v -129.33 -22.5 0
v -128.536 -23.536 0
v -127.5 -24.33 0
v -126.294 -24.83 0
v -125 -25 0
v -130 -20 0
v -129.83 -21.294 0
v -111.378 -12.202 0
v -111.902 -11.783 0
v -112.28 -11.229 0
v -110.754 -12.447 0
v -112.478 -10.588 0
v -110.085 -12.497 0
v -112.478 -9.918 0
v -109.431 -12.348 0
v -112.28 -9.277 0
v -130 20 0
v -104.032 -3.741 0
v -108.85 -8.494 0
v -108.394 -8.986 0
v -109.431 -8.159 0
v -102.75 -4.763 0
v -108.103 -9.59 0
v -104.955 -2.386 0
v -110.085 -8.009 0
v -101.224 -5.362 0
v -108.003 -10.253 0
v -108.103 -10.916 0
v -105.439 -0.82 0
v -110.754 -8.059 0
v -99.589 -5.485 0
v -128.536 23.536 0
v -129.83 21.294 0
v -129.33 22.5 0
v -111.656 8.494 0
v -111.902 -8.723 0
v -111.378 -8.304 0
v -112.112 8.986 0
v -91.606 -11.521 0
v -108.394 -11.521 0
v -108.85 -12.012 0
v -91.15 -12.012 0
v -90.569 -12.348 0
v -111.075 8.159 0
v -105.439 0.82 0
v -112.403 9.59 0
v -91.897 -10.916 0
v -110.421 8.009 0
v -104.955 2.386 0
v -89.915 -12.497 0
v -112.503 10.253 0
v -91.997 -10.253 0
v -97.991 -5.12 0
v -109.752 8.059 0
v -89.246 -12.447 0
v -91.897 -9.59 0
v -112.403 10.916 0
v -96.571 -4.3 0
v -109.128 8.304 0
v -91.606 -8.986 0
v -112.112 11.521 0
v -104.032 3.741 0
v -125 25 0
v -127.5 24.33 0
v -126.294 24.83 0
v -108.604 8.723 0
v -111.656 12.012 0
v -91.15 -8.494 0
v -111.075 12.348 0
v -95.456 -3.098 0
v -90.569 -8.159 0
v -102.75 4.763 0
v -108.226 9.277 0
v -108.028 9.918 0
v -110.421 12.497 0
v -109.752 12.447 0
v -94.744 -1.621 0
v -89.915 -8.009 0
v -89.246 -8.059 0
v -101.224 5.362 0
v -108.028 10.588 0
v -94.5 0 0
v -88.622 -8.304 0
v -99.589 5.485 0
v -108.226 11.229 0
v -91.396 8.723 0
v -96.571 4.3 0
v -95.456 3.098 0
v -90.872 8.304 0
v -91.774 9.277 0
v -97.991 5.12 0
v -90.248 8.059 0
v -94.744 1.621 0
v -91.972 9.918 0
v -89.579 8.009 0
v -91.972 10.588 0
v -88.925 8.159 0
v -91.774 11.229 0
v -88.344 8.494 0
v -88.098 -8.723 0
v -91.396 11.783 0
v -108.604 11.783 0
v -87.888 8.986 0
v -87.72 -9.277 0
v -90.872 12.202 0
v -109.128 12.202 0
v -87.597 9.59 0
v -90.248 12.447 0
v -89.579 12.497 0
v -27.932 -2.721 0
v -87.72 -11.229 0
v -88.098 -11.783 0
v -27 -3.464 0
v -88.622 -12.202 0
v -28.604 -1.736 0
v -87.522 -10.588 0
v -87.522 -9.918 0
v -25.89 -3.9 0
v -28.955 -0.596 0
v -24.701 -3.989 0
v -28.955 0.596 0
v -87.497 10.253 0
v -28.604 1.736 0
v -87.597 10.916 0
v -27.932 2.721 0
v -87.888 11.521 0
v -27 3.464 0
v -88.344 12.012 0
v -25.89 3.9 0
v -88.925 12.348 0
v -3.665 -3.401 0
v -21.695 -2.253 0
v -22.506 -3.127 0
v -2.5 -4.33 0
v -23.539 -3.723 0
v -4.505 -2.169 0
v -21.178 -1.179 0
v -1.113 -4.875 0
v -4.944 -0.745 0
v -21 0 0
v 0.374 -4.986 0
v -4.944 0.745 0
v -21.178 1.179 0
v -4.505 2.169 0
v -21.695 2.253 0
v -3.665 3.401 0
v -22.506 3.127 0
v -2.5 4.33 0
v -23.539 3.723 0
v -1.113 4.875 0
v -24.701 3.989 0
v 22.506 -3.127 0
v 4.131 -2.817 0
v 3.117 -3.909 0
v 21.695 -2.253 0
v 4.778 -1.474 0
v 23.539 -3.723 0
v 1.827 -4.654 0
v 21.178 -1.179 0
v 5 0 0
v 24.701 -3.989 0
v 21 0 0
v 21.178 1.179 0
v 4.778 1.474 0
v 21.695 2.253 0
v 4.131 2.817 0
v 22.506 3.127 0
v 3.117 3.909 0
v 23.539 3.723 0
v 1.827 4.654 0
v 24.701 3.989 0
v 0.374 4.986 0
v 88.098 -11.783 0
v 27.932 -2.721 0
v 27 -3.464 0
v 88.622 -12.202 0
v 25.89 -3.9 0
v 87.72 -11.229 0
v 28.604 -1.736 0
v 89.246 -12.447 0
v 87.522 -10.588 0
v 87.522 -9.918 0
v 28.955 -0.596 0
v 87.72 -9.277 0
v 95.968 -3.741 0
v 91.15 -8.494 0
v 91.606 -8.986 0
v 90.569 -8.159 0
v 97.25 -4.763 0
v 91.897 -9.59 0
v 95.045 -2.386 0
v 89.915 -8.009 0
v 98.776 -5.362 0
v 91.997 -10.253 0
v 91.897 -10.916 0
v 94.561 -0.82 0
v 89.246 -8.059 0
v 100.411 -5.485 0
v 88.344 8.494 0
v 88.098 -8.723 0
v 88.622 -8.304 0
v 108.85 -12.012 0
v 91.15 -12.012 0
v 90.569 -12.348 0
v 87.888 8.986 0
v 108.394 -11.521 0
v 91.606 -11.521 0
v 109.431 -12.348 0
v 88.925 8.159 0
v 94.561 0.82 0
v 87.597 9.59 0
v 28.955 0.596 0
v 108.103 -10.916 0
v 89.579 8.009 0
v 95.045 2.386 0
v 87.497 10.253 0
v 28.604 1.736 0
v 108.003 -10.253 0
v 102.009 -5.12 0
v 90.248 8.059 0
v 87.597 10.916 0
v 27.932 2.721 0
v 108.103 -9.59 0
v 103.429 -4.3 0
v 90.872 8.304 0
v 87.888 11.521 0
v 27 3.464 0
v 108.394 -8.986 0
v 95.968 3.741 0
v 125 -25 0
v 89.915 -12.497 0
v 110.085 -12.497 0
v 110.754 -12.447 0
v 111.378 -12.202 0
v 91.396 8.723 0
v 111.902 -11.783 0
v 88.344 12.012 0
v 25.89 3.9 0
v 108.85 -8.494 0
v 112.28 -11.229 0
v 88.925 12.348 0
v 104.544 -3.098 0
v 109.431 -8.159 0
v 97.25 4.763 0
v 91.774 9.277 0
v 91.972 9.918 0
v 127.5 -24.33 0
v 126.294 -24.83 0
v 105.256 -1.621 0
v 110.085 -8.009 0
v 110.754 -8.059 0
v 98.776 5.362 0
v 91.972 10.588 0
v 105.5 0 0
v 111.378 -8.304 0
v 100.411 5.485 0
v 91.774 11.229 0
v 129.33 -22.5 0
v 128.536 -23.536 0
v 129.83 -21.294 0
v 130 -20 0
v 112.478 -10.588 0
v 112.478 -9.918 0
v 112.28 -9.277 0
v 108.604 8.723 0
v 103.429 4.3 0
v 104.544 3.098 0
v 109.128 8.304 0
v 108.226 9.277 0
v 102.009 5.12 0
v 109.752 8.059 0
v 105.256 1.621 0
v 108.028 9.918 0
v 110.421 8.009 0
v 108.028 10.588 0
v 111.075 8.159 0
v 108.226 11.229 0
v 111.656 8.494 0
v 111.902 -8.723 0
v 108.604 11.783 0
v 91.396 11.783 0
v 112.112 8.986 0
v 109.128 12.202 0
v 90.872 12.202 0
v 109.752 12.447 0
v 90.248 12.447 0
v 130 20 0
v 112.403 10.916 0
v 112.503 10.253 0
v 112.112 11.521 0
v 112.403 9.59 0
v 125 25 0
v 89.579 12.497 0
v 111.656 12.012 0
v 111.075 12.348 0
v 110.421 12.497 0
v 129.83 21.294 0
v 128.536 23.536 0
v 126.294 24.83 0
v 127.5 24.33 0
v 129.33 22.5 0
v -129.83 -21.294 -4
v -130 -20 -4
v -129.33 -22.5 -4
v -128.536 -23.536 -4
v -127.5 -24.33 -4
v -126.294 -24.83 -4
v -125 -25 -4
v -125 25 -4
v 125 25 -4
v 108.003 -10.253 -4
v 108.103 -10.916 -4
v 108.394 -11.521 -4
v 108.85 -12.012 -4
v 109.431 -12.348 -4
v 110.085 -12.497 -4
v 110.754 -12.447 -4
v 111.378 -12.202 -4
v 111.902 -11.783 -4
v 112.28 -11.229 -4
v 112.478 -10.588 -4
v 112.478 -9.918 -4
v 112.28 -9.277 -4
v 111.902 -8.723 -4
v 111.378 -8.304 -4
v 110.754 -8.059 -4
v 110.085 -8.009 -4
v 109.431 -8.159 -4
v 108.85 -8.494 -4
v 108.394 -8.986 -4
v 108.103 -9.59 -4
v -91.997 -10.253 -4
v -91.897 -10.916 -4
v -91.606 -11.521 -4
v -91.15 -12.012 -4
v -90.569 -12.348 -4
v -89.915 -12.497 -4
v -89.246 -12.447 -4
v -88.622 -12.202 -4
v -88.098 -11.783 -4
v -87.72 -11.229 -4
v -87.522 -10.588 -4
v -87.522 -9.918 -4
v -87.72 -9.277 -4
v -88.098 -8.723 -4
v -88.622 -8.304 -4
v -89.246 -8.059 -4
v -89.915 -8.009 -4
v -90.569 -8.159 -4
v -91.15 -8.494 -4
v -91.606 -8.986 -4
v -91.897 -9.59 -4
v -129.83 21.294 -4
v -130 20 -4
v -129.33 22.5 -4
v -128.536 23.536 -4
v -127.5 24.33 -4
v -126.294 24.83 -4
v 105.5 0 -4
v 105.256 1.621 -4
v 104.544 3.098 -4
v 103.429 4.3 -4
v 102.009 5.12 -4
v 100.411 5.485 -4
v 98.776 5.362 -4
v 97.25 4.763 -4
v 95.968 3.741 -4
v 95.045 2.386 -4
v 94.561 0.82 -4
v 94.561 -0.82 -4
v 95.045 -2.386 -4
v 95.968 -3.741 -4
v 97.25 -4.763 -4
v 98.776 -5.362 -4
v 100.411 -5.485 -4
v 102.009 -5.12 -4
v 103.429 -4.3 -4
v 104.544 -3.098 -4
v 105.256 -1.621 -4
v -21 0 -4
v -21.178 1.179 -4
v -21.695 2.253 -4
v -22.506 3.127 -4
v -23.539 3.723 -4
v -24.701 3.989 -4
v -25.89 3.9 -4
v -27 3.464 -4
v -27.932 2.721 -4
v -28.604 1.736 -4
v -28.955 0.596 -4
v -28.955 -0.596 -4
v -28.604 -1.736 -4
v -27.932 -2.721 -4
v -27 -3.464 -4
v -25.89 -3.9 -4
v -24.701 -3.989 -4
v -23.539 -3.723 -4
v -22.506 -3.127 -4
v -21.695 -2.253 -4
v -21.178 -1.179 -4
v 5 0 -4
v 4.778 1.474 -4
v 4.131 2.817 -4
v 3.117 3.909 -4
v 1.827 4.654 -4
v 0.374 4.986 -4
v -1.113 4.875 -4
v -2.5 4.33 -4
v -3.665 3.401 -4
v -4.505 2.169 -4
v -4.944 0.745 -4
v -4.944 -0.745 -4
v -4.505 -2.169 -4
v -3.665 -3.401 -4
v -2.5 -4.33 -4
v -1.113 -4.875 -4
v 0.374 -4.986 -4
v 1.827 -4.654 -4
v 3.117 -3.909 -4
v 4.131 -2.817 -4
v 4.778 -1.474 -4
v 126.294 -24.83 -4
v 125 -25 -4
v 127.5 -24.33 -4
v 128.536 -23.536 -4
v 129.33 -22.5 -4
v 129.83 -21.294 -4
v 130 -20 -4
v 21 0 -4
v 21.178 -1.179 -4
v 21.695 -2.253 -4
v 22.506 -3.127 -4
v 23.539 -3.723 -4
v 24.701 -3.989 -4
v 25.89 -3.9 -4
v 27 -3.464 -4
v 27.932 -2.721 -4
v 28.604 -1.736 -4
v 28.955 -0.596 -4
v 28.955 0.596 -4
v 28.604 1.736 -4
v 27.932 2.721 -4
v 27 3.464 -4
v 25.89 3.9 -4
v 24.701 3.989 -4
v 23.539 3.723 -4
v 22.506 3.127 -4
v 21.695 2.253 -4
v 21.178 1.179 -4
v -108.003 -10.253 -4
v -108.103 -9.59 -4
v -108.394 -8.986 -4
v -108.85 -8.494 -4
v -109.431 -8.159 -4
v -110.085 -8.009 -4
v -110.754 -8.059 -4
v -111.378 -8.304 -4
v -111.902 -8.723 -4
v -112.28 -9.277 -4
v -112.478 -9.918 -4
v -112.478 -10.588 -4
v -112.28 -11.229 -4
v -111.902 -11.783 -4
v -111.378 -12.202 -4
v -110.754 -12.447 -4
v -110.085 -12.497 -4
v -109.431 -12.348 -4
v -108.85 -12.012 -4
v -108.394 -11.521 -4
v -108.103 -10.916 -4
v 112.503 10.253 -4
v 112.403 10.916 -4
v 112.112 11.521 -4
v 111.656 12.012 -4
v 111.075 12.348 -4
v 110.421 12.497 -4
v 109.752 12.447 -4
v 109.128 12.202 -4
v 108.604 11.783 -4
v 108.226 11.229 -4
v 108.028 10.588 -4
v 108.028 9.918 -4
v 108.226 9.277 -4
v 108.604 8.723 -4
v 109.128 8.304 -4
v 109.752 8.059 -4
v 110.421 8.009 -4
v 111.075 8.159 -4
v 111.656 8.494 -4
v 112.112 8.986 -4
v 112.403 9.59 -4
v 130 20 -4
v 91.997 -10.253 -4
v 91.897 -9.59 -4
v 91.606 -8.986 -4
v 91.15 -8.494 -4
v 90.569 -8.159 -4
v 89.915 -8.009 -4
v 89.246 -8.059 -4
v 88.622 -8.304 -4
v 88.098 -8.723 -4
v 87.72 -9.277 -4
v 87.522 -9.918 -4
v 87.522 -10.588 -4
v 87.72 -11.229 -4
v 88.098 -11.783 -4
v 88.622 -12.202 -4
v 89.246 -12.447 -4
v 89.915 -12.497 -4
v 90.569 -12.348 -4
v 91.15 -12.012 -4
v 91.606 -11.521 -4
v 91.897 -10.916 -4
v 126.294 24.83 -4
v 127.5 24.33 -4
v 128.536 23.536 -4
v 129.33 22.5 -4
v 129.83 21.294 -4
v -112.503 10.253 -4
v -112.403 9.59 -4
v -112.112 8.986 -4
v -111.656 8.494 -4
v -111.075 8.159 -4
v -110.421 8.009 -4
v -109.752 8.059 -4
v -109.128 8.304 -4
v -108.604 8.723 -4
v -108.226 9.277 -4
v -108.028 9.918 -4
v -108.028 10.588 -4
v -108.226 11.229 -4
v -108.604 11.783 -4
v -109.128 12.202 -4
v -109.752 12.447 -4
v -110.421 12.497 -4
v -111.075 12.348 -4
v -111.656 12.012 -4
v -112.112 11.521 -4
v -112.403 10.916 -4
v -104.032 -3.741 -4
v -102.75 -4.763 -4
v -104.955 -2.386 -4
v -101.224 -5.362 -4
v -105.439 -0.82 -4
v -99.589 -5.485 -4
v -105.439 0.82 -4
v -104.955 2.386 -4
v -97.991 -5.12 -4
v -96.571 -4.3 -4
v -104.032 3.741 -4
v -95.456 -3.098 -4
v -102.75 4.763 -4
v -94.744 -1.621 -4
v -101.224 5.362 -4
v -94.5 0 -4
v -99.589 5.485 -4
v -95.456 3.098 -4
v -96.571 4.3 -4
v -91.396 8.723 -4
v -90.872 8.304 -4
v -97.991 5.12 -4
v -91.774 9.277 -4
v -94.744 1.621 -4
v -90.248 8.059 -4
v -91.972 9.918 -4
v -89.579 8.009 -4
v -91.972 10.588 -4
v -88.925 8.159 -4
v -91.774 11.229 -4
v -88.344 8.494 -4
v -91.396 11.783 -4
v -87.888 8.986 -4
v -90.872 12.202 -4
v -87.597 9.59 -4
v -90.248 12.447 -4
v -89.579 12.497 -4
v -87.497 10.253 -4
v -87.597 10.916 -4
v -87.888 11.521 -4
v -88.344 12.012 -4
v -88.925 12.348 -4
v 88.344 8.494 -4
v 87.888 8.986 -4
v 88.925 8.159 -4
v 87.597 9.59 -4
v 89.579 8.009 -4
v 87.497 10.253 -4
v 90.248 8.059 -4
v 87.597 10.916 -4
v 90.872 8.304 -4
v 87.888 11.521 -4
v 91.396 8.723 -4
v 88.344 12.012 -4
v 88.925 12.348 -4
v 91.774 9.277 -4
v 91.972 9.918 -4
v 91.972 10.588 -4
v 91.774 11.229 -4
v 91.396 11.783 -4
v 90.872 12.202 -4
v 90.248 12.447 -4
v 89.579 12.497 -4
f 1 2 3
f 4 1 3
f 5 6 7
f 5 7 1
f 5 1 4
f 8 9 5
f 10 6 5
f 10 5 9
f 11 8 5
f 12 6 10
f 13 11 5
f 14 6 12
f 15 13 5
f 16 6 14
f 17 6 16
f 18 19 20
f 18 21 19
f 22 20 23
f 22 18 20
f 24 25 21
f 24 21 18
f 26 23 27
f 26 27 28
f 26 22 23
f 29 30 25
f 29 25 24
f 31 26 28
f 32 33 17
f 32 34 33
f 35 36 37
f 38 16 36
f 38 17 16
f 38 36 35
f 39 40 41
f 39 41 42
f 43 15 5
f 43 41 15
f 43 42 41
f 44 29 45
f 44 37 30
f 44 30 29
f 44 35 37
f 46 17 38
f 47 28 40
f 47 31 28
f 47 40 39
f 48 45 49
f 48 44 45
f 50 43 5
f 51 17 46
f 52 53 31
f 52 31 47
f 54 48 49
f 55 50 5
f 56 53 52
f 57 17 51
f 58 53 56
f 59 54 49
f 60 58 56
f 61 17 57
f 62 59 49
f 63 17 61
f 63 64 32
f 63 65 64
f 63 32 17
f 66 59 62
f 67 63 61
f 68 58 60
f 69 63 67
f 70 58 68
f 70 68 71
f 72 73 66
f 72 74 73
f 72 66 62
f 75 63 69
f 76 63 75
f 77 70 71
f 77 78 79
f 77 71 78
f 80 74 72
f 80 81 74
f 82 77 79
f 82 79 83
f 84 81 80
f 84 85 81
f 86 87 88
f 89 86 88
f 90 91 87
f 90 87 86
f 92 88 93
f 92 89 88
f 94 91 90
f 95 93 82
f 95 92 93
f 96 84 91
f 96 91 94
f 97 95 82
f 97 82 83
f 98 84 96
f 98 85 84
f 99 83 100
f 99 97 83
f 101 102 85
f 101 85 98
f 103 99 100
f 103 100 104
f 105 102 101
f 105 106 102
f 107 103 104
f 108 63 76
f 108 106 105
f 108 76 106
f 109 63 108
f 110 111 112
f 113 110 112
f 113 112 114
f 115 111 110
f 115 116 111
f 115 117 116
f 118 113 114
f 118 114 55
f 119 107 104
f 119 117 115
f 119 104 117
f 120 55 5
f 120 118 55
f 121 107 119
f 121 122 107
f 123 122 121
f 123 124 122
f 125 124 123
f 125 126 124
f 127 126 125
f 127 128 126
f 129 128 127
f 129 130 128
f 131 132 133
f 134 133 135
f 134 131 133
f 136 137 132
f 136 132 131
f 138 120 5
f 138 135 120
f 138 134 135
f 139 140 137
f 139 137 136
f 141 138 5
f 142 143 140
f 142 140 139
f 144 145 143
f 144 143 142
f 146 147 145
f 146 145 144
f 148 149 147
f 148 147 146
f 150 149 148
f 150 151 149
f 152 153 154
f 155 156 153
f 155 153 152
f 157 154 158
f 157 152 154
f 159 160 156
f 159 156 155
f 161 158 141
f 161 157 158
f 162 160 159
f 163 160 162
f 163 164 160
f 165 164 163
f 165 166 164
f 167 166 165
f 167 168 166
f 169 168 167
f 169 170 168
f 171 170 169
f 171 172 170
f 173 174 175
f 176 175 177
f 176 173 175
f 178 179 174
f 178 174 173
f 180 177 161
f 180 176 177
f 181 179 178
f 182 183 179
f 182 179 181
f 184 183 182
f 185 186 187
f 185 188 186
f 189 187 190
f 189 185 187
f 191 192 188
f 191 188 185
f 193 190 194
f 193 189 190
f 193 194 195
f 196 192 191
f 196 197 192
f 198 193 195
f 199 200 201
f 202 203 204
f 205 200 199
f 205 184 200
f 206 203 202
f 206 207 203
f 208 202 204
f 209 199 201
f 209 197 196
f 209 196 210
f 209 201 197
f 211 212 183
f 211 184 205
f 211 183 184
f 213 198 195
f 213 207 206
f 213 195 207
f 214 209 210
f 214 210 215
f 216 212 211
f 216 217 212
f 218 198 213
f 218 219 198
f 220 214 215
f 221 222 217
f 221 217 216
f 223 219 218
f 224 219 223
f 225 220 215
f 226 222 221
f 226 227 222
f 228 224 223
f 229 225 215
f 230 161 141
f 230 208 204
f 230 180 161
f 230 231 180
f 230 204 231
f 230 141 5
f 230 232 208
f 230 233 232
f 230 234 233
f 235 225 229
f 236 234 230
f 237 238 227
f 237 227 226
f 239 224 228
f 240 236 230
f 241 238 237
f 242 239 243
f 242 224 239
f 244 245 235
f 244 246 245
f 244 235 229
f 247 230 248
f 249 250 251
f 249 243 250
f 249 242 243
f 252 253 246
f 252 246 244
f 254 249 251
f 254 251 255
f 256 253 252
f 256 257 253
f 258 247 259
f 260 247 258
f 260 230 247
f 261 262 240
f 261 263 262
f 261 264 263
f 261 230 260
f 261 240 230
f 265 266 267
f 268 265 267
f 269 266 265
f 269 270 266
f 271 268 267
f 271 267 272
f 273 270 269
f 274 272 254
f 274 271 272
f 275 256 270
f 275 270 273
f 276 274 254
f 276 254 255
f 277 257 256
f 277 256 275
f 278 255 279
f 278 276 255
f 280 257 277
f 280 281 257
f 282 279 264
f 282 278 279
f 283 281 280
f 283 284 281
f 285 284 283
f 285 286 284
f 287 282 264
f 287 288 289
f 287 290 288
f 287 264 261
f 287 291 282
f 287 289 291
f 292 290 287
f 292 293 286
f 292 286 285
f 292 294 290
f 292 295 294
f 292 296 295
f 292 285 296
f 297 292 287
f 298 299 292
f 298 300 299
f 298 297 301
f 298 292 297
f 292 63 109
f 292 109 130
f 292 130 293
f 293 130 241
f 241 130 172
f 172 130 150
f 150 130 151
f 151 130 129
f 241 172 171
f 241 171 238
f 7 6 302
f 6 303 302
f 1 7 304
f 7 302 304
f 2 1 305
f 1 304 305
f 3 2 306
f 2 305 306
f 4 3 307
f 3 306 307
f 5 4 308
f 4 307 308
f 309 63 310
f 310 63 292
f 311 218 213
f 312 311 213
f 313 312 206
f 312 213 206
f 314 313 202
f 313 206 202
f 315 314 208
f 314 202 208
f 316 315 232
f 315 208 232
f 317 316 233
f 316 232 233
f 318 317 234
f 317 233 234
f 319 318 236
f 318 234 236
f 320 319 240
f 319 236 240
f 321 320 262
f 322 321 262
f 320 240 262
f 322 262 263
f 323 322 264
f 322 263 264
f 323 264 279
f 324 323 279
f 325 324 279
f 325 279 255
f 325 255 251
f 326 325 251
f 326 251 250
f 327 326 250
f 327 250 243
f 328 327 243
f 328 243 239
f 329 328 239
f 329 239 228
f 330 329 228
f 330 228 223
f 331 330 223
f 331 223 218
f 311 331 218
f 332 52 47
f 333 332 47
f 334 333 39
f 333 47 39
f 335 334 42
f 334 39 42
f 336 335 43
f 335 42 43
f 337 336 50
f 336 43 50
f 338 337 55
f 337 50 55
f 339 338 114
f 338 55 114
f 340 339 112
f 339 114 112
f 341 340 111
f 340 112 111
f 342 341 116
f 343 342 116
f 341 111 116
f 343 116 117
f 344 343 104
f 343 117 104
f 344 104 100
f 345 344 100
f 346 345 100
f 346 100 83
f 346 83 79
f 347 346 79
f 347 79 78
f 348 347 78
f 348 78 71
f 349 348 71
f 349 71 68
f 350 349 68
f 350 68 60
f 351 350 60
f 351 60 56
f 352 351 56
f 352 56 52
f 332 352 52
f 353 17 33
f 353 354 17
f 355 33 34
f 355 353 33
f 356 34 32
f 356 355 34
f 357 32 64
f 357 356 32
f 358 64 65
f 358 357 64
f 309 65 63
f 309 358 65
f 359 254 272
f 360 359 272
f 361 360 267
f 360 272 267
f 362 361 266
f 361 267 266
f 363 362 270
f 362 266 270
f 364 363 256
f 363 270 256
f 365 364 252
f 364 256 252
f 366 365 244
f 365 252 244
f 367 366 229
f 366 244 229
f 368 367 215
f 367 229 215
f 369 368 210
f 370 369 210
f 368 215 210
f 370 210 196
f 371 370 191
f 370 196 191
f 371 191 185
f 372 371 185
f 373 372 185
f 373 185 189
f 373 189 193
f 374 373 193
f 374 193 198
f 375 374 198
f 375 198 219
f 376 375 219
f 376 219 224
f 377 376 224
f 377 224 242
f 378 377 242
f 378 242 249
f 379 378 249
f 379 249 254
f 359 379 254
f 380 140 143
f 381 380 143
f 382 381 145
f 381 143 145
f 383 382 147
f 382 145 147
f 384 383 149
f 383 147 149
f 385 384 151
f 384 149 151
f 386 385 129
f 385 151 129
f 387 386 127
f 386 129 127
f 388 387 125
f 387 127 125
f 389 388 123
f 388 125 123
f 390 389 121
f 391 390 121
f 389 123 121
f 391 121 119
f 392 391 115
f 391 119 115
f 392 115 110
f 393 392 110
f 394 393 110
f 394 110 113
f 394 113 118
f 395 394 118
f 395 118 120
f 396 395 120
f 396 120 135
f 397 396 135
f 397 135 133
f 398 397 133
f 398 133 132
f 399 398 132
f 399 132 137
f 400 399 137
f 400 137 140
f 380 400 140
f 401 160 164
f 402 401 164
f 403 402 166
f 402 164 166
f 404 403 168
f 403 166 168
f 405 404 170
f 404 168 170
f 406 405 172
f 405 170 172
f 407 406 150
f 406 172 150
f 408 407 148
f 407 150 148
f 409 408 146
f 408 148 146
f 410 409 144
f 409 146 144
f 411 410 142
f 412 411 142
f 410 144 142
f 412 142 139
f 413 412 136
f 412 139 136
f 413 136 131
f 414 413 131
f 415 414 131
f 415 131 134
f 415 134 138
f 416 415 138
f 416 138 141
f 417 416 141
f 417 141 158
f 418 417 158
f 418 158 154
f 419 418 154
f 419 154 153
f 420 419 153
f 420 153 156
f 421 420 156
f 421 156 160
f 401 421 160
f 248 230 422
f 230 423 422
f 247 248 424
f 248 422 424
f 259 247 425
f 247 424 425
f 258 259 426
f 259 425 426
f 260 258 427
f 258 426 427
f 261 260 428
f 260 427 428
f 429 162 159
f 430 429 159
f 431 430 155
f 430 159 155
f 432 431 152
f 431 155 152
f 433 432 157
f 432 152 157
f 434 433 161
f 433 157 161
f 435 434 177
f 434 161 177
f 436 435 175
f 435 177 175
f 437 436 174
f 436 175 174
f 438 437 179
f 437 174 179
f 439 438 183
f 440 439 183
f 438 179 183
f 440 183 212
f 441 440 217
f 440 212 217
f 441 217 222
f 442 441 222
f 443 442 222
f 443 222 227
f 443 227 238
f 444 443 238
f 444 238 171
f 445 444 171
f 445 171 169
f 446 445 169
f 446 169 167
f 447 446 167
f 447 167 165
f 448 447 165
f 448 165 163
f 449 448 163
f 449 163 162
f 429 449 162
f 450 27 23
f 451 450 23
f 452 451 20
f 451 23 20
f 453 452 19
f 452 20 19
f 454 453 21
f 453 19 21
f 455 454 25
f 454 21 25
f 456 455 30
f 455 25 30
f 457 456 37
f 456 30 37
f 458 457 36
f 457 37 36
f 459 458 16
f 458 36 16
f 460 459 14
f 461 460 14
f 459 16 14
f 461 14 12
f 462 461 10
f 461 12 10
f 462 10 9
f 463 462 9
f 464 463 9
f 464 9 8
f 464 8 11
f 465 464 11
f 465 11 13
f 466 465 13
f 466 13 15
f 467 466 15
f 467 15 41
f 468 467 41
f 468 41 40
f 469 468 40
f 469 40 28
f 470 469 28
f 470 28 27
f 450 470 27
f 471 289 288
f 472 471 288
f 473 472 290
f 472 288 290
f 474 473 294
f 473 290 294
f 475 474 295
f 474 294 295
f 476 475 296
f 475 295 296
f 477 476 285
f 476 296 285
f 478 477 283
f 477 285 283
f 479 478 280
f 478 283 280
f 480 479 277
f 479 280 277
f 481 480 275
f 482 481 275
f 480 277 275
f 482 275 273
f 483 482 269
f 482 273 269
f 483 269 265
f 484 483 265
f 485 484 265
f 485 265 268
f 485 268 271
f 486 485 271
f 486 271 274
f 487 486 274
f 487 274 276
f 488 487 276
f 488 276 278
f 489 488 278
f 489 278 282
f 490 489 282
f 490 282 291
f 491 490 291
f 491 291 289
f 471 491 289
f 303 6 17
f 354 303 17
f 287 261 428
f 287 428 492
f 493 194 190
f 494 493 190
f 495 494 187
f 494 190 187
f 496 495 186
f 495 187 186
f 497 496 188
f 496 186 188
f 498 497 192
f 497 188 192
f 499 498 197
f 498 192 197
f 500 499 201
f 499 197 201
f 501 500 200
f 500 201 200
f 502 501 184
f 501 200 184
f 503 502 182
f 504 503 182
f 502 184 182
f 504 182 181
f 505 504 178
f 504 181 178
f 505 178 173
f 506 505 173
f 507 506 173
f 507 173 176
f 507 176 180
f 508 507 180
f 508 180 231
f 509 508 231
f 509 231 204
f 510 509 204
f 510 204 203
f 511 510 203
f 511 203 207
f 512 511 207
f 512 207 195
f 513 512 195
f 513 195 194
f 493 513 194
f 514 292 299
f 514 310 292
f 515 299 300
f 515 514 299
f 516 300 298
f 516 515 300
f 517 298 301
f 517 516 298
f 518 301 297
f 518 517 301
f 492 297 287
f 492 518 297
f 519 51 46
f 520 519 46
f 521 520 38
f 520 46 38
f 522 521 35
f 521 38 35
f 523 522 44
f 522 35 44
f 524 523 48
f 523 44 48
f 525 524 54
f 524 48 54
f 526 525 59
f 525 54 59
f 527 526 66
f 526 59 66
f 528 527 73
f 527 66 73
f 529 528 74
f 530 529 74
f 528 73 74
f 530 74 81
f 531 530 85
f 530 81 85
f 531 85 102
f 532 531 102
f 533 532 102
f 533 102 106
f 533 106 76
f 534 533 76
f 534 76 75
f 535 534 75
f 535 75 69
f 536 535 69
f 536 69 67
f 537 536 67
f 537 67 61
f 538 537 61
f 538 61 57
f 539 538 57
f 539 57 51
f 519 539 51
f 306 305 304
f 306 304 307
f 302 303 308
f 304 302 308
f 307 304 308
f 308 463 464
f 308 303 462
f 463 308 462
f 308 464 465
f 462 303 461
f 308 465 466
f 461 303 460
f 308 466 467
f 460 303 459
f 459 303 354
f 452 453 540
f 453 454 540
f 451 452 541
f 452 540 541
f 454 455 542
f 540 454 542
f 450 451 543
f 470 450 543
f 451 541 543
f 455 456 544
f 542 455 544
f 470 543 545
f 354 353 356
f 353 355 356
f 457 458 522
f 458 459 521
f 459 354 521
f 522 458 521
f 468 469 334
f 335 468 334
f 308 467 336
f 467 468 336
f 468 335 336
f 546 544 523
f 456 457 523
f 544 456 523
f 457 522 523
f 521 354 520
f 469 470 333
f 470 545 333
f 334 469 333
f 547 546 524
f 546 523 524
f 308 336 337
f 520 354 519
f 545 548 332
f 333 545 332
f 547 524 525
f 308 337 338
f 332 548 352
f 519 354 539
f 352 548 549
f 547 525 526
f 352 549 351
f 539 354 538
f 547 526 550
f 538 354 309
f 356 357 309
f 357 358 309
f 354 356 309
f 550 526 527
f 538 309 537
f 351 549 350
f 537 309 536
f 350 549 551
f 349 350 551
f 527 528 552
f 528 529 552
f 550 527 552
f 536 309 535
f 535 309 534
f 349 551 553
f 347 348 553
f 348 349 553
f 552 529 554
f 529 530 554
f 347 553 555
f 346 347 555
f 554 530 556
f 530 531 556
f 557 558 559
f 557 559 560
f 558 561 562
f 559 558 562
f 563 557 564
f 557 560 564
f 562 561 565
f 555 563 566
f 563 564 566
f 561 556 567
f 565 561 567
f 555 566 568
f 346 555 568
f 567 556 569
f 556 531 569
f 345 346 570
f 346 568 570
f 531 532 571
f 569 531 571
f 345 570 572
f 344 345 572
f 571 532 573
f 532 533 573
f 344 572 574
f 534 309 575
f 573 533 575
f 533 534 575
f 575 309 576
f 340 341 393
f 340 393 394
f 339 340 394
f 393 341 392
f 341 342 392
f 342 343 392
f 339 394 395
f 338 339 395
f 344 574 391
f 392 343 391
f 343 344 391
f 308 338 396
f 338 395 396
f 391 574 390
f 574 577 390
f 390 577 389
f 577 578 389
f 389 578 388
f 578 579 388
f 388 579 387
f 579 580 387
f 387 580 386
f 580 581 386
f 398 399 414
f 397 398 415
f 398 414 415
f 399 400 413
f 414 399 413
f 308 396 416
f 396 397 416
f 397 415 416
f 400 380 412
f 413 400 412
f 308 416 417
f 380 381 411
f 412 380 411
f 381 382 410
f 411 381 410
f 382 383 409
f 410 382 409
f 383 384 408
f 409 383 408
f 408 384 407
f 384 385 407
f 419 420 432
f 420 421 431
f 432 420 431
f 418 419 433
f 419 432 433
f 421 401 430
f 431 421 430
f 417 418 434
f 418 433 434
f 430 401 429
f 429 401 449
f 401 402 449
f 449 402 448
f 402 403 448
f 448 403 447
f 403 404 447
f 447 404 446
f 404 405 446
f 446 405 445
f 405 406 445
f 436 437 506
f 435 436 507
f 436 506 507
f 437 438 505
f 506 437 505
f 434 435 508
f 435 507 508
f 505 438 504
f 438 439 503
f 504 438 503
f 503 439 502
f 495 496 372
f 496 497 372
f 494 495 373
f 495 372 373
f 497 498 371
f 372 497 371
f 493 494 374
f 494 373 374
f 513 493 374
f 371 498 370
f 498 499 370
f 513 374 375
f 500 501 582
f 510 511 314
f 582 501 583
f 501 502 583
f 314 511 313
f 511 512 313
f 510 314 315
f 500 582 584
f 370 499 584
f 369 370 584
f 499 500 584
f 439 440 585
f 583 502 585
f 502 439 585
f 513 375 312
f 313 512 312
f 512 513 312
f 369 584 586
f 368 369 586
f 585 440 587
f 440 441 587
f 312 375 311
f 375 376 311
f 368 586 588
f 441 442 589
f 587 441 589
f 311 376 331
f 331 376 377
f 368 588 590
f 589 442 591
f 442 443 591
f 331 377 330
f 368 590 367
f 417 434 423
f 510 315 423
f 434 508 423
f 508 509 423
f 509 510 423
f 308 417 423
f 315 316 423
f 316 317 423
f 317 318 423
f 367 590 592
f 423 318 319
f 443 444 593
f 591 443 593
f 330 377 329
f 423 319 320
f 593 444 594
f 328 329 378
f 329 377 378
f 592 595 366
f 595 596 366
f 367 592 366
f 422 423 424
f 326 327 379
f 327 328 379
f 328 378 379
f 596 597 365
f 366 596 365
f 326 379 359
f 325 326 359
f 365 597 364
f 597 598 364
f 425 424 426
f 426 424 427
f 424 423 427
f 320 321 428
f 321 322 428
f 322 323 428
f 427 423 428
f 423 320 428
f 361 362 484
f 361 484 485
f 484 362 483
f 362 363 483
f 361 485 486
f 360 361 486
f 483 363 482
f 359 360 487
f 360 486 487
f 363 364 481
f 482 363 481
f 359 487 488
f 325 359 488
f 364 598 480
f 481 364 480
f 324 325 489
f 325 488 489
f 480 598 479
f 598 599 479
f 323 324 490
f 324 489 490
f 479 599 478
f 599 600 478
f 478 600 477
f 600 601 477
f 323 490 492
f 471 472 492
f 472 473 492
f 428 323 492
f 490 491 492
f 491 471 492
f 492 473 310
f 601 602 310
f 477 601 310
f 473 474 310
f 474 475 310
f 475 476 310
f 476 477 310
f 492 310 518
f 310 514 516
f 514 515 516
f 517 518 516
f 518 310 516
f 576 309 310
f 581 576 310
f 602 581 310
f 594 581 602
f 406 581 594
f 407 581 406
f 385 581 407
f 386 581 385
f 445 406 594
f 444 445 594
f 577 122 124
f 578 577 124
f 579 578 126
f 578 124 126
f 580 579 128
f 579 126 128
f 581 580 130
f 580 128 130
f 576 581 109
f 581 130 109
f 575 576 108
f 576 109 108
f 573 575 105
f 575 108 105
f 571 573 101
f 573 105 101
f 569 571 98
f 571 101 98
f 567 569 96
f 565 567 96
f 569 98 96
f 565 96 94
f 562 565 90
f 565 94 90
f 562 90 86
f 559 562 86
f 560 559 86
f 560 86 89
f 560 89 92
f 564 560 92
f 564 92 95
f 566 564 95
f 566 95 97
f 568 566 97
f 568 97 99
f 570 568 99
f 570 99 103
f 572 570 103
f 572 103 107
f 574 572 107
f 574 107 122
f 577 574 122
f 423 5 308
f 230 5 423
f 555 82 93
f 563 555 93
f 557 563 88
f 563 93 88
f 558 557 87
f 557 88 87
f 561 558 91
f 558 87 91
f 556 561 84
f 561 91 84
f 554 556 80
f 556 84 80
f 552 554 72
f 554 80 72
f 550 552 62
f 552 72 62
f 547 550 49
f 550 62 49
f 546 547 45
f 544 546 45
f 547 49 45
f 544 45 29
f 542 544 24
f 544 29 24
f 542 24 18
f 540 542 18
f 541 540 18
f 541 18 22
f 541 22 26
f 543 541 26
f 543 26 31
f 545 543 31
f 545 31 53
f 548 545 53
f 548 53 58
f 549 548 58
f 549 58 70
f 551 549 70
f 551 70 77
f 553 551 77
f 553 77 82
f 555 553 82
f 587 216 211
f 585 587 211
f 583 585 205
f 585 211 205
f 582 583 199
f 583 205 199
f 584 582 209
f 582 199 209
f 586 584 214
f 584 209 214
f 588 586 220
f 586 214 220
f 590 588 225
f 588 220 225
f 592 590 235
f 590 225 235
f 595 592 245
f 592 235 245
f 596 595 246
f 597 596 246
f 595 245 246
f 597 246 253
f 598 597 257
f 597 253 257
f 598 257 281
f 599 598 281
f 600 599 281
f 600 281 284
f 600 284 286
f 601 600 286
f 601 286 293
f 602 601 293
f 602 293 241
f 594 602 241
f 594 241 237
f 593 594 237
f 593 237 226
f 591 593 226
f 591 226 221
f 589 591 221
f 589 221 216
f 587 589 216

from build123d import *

# Parameters (mm, degrees)
SKETCH1_W          = 260
SKETCH1_H          = 50
BASE_FLANGE1_DEPTH = 4
SKETCH6_R          = 5.5
SKETCH6_R_2        = 5
SKETCH6_R_3        = 4
SKETCH6_R_4        = 2.25
CUT_EXTRUDE1_DEPTH = 10
FILLET1_R          = 5


# Sheet-metal steps are written as plain solids
with BuildPart() as part:
    # Sketch1 → Base-Flange1 (new body)
    with BuildSketch(Plane.XY):
        Rectangle(SKETCH1_W, SKETCH1_H)
    extrude(amount=-BASE_FLANGE1_DEPTH)

    # Sketch6 → Cut-Extrude1 (cut)
    with BuildSketch(Plane.XY):
        with Locations((100, 0)):
            Circle(SKETCH6_R)
        with Locations((-100, 0)):
            Circle(SKETCH6_R)
        Circle(SKETCH6_R_2)
        with Locations((-25, 0)):
            Circle(SKETCH6_R_3)
        with Locations(Location((25, 0, 0), (0, 0, 180))):
            Circle(SKETCH6_R_3)
        with Locations((110.253048327, 10.253048327)):
            Circle(SKETCH6_R_4)
        with Locations(Location((89.746951673, 10.253048327, 0), (0, 0, 180))):
            Circle(SKETCH6_R_4)
        with Locations((89.746951673, -10.253048327)):
            Circle(SKETCH6_R_4)
        with Locations(Location((110.253048327, -10.253048327, 0), (0, 0, 180))):
            Circle(SKETCH6_R_4)
        with Locations((-110.253048327, -10.253048327)):
            Circle(SKETCH6_R_4)
        with Locations(Location((-89.746951673, -10.253048327, 0), (0, 0, 180))):
            Circle(SKETCH6_R_4)
        with Locations((-89.746951673, 10.253048327)):
            Circle(SKETCH6_R_4)
        with Locations(Location((-110.253048327, 10.253048327, 0), (0, 0, 180))):
            Circle(SKETCH6_R_4)
    extrude(amount=-CUT_EXTRUDE1_DEPTH, mode=Mode.SUBTRACT)

    # Fillet1
    fillet1_edges = [part.edges().sort_by_distance(p)[0] for p in [
        (130, -25, -2),
        (-130, -25, -2),
        (-130, 25, -2),
        (130, 25, -2),
    ]]
    fillet(fillet1_edges, radius=FILLET1_R)


solid = part.part
